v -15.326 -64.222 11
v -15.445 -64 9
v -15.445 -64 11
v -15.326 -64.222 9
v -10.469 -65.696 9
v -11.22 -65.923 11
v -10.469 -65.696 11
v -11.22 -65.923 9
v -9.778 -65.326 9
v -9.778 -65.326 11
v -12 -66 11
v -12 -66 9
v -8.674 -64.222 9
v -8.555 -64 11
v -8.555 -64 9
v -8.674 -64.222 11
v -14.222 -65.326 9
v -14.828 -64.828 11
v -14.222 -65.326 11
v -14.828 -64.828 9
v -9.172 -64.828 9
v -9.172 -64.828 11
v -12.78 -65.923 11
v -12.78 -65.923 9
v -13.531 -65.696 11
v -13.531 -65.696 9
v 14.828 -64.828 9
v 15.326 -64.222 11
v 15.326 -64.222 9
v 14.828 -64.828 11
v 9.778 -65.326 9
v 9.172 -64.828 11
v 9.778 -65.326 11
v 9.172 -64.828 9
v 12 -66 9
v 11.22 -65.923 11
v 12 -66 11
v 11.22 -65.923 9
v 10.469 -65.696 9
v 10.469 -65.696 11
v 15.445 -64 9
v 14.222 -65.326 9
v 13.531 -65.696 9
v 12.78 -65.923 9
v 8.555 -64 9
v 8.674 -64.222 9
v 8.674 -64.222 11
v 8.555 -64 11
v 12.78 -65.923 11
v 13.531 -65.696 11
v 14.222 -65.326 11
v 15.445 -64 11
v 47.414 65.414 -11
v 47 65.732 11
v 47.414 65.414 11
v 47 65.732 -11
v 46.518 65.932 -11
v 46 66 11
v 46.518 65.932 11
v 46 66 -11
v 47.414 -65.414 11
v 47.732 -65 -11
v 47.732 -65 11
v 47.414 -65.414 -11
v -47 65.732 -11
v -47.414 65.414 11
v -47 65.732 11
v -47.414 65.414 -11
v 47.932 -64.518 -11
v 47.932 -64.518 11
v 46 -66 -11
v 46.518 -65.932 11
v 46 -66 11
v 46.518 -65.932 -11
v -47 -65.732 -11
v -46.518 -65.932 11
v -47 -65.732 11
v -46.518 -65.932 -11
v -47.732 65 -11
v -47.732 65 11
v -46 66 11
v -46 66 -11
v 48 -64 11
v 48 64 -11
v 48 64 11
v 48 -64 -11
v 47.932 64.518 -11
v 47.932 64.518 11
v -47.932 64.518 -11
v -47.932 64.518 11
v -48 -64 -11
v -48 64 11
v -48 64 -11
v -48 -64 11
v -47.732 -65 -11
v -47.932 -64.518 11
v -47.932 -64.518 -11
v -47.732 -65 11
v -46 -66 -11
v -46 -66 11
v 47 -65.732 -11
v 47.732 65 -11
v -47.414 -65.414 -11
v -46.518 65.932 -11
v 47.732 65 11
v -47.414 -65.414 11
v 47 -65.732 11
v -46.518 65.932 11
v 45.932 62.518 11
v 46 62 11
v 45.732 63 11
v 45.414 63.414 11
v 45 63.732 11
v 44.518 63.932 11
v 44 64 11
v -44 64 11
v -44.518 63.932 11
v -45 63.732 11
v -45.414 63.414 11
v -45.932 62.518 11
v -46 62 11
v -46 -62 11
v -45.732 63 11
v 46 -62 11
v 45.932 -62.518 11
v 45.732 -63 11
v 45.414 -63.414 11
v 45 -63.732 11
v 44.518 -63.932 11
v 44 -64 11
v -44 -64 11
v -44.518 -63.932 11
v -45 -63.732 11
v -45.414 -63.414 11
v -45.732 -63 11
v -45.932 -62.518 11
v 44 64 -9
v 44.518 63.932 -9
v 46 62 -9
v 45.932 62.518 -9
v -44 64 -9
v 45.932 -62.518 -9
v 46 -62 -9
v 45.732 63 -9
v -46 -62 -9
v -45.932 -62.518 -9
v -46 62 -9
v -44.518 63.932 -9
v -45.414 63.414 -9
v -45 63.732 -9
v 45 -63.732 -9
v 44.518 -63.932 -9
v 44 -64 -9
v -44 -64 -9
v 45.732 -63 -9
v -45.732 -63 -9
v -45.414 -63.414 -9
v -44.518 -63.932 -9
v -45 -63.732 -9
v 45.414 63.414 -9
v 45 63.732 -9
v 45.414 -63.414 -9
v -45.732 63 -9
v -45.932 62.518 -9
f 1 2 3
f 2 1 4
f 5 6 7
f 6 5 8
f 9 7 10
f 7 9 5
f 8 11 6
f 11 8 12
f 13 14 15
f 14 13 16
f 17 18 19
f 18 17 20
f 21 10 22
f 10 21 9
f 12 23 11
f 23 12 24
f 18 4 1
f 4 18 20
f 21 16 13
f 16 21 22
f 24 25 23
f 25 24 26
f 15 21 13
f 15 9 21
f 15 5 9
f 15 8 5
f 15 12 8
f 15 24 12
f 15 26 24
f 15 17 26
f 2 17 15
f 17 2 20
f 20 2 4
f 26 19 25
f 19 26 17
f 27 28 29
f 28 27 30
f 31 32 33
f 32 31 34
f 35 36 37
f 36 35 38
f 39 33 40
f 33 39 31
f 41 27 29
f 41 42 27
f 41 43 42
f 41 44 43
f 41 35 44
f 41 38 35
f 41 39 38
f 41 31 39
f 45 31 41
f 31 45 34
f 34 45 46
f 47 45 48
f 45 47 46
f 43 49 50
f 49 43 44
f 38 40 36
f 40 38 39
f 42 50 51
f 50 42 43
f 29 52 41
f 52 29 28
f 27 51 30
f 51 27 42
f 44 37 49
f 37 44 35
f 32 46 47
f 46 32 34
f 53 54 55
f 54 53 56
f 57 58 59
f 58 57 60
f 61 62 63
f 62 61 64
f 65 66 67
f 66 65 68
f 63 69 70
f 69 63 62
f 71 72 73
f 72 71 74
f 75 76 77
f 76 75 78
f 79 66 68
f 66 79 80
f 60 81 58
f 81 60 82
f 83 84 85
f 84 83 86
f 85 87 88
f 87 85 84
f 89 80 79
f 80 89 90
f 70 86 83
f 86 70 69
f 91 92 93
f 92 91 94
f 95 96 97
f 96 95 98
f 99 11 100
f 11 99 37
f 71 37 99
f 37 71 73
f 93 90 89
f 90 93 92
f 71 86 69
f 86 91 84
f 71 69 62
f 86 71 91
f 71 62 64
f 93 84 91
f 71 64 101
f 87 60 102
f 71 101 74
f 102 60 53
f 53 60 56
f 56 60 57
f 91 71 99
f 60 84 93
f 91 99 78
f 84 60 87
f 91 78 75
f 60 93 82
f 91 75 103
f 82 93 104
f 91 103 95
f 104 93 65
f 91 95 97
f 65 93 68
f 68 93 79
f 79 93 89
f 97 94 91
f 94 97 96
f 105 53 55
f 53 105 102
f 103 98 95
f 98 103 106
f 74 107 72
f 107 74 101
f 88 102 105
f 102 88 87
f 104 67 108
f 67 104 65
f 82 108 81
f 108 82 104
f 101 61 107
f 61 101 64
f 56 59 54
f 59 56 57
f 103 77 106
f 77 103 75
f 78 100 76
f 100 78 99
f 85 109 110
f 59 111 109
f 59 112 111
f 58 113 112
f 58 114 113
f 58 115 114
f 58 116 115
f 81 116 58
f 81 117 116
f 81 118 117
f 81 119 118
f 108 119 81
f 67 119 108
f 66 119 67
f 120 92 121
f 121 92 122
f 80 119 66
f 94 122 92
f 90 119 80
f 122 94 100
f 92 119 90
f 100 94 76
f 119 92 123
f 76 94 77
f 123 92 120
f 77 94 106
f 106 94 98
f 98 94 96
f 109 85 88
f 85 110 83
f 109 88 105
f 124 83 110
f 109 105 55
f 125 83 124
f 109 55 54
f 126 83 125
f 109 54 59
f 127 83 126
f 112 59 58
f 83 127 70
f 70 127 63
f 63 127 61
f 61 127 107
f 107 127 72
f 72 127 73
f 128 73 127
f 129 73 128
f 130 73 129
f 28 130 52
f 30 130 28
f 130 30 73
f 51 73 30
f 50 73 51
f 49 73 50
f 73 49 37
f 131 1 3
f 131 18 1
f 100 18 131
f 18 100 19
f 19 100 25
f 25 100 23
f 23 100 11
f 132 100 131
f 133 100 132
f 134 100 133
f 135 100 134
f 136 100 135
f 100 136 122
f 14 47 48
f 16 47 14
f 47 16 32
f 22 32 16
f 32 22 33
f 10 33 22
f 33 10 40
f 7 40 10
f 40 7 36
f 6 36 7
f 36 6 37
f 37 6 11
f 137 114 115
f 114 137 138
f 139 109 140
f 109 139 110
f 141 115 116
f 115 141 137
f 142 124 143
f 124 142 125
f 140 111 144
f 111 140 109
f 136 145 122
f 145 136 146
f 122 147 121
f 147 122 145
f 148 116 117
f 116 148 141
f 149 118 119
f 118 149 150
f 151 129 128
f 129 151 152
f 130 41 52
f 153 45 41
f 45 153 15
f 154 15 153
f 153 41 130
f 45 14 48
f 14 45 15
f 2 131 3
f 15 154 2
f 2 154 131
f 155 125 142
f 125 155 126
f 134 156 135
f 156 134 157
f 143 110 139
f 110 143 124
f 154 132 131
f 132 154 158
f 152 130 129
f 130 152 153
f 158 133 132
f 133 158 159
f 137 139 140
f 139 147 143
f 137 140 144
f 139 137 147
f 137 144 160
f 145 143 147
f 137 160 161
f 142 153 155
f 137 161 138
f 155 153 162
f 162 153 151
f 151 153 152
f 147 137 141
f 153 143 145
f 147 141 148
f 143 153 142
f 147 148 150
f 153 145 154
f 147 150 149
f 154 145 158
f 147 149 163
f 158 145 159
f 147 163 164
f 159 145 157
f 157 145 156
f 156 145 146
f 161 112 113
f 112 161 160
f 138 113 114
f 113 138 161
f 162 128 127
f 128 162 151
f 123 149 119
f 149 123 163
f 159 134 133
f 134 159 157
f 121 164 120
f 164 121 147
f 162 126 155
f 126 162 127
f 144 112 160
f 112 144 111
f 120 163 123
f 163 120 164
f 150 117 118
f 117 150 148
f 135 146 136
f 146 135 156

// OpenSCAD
// PRG32 v2 enclosure starter.
// Dimensions are conservative placeholders for classroom iteration.

case_w = 96;
case_h = 132;
case_d = 22;
wall = 2;

module rounded_box(w, h, d) {
    minkowski() {
        cube([w - 4, h - 4, d - 2], center = true);
        cylinder(r = 2, h = 2, center = true, $fn = 24);
    }
}

difference() {
    rounded_box(case_w, case_h, case_d);
    translate([0, 0, wall])
        rounded_box(case_w - wall * 2, case_h - wall * 2, case_d);

    // Display opening.
    translate([0, 18, case_d / 2])
        cube([72, 52, 4], center = true);

    // Button openings.
    for (x = [-24, 0, 24]) {
        translate([x, -44, case_d / 2])
            cylinder(r = 4, h = 4, center = true, $fn = 32);
    }
    for (x = [-12, 12]) {
        translate([x, -62, case_d / 2])
            cylinder(r = 4, h = 4, center = true, $fn = 32);
    }
}
